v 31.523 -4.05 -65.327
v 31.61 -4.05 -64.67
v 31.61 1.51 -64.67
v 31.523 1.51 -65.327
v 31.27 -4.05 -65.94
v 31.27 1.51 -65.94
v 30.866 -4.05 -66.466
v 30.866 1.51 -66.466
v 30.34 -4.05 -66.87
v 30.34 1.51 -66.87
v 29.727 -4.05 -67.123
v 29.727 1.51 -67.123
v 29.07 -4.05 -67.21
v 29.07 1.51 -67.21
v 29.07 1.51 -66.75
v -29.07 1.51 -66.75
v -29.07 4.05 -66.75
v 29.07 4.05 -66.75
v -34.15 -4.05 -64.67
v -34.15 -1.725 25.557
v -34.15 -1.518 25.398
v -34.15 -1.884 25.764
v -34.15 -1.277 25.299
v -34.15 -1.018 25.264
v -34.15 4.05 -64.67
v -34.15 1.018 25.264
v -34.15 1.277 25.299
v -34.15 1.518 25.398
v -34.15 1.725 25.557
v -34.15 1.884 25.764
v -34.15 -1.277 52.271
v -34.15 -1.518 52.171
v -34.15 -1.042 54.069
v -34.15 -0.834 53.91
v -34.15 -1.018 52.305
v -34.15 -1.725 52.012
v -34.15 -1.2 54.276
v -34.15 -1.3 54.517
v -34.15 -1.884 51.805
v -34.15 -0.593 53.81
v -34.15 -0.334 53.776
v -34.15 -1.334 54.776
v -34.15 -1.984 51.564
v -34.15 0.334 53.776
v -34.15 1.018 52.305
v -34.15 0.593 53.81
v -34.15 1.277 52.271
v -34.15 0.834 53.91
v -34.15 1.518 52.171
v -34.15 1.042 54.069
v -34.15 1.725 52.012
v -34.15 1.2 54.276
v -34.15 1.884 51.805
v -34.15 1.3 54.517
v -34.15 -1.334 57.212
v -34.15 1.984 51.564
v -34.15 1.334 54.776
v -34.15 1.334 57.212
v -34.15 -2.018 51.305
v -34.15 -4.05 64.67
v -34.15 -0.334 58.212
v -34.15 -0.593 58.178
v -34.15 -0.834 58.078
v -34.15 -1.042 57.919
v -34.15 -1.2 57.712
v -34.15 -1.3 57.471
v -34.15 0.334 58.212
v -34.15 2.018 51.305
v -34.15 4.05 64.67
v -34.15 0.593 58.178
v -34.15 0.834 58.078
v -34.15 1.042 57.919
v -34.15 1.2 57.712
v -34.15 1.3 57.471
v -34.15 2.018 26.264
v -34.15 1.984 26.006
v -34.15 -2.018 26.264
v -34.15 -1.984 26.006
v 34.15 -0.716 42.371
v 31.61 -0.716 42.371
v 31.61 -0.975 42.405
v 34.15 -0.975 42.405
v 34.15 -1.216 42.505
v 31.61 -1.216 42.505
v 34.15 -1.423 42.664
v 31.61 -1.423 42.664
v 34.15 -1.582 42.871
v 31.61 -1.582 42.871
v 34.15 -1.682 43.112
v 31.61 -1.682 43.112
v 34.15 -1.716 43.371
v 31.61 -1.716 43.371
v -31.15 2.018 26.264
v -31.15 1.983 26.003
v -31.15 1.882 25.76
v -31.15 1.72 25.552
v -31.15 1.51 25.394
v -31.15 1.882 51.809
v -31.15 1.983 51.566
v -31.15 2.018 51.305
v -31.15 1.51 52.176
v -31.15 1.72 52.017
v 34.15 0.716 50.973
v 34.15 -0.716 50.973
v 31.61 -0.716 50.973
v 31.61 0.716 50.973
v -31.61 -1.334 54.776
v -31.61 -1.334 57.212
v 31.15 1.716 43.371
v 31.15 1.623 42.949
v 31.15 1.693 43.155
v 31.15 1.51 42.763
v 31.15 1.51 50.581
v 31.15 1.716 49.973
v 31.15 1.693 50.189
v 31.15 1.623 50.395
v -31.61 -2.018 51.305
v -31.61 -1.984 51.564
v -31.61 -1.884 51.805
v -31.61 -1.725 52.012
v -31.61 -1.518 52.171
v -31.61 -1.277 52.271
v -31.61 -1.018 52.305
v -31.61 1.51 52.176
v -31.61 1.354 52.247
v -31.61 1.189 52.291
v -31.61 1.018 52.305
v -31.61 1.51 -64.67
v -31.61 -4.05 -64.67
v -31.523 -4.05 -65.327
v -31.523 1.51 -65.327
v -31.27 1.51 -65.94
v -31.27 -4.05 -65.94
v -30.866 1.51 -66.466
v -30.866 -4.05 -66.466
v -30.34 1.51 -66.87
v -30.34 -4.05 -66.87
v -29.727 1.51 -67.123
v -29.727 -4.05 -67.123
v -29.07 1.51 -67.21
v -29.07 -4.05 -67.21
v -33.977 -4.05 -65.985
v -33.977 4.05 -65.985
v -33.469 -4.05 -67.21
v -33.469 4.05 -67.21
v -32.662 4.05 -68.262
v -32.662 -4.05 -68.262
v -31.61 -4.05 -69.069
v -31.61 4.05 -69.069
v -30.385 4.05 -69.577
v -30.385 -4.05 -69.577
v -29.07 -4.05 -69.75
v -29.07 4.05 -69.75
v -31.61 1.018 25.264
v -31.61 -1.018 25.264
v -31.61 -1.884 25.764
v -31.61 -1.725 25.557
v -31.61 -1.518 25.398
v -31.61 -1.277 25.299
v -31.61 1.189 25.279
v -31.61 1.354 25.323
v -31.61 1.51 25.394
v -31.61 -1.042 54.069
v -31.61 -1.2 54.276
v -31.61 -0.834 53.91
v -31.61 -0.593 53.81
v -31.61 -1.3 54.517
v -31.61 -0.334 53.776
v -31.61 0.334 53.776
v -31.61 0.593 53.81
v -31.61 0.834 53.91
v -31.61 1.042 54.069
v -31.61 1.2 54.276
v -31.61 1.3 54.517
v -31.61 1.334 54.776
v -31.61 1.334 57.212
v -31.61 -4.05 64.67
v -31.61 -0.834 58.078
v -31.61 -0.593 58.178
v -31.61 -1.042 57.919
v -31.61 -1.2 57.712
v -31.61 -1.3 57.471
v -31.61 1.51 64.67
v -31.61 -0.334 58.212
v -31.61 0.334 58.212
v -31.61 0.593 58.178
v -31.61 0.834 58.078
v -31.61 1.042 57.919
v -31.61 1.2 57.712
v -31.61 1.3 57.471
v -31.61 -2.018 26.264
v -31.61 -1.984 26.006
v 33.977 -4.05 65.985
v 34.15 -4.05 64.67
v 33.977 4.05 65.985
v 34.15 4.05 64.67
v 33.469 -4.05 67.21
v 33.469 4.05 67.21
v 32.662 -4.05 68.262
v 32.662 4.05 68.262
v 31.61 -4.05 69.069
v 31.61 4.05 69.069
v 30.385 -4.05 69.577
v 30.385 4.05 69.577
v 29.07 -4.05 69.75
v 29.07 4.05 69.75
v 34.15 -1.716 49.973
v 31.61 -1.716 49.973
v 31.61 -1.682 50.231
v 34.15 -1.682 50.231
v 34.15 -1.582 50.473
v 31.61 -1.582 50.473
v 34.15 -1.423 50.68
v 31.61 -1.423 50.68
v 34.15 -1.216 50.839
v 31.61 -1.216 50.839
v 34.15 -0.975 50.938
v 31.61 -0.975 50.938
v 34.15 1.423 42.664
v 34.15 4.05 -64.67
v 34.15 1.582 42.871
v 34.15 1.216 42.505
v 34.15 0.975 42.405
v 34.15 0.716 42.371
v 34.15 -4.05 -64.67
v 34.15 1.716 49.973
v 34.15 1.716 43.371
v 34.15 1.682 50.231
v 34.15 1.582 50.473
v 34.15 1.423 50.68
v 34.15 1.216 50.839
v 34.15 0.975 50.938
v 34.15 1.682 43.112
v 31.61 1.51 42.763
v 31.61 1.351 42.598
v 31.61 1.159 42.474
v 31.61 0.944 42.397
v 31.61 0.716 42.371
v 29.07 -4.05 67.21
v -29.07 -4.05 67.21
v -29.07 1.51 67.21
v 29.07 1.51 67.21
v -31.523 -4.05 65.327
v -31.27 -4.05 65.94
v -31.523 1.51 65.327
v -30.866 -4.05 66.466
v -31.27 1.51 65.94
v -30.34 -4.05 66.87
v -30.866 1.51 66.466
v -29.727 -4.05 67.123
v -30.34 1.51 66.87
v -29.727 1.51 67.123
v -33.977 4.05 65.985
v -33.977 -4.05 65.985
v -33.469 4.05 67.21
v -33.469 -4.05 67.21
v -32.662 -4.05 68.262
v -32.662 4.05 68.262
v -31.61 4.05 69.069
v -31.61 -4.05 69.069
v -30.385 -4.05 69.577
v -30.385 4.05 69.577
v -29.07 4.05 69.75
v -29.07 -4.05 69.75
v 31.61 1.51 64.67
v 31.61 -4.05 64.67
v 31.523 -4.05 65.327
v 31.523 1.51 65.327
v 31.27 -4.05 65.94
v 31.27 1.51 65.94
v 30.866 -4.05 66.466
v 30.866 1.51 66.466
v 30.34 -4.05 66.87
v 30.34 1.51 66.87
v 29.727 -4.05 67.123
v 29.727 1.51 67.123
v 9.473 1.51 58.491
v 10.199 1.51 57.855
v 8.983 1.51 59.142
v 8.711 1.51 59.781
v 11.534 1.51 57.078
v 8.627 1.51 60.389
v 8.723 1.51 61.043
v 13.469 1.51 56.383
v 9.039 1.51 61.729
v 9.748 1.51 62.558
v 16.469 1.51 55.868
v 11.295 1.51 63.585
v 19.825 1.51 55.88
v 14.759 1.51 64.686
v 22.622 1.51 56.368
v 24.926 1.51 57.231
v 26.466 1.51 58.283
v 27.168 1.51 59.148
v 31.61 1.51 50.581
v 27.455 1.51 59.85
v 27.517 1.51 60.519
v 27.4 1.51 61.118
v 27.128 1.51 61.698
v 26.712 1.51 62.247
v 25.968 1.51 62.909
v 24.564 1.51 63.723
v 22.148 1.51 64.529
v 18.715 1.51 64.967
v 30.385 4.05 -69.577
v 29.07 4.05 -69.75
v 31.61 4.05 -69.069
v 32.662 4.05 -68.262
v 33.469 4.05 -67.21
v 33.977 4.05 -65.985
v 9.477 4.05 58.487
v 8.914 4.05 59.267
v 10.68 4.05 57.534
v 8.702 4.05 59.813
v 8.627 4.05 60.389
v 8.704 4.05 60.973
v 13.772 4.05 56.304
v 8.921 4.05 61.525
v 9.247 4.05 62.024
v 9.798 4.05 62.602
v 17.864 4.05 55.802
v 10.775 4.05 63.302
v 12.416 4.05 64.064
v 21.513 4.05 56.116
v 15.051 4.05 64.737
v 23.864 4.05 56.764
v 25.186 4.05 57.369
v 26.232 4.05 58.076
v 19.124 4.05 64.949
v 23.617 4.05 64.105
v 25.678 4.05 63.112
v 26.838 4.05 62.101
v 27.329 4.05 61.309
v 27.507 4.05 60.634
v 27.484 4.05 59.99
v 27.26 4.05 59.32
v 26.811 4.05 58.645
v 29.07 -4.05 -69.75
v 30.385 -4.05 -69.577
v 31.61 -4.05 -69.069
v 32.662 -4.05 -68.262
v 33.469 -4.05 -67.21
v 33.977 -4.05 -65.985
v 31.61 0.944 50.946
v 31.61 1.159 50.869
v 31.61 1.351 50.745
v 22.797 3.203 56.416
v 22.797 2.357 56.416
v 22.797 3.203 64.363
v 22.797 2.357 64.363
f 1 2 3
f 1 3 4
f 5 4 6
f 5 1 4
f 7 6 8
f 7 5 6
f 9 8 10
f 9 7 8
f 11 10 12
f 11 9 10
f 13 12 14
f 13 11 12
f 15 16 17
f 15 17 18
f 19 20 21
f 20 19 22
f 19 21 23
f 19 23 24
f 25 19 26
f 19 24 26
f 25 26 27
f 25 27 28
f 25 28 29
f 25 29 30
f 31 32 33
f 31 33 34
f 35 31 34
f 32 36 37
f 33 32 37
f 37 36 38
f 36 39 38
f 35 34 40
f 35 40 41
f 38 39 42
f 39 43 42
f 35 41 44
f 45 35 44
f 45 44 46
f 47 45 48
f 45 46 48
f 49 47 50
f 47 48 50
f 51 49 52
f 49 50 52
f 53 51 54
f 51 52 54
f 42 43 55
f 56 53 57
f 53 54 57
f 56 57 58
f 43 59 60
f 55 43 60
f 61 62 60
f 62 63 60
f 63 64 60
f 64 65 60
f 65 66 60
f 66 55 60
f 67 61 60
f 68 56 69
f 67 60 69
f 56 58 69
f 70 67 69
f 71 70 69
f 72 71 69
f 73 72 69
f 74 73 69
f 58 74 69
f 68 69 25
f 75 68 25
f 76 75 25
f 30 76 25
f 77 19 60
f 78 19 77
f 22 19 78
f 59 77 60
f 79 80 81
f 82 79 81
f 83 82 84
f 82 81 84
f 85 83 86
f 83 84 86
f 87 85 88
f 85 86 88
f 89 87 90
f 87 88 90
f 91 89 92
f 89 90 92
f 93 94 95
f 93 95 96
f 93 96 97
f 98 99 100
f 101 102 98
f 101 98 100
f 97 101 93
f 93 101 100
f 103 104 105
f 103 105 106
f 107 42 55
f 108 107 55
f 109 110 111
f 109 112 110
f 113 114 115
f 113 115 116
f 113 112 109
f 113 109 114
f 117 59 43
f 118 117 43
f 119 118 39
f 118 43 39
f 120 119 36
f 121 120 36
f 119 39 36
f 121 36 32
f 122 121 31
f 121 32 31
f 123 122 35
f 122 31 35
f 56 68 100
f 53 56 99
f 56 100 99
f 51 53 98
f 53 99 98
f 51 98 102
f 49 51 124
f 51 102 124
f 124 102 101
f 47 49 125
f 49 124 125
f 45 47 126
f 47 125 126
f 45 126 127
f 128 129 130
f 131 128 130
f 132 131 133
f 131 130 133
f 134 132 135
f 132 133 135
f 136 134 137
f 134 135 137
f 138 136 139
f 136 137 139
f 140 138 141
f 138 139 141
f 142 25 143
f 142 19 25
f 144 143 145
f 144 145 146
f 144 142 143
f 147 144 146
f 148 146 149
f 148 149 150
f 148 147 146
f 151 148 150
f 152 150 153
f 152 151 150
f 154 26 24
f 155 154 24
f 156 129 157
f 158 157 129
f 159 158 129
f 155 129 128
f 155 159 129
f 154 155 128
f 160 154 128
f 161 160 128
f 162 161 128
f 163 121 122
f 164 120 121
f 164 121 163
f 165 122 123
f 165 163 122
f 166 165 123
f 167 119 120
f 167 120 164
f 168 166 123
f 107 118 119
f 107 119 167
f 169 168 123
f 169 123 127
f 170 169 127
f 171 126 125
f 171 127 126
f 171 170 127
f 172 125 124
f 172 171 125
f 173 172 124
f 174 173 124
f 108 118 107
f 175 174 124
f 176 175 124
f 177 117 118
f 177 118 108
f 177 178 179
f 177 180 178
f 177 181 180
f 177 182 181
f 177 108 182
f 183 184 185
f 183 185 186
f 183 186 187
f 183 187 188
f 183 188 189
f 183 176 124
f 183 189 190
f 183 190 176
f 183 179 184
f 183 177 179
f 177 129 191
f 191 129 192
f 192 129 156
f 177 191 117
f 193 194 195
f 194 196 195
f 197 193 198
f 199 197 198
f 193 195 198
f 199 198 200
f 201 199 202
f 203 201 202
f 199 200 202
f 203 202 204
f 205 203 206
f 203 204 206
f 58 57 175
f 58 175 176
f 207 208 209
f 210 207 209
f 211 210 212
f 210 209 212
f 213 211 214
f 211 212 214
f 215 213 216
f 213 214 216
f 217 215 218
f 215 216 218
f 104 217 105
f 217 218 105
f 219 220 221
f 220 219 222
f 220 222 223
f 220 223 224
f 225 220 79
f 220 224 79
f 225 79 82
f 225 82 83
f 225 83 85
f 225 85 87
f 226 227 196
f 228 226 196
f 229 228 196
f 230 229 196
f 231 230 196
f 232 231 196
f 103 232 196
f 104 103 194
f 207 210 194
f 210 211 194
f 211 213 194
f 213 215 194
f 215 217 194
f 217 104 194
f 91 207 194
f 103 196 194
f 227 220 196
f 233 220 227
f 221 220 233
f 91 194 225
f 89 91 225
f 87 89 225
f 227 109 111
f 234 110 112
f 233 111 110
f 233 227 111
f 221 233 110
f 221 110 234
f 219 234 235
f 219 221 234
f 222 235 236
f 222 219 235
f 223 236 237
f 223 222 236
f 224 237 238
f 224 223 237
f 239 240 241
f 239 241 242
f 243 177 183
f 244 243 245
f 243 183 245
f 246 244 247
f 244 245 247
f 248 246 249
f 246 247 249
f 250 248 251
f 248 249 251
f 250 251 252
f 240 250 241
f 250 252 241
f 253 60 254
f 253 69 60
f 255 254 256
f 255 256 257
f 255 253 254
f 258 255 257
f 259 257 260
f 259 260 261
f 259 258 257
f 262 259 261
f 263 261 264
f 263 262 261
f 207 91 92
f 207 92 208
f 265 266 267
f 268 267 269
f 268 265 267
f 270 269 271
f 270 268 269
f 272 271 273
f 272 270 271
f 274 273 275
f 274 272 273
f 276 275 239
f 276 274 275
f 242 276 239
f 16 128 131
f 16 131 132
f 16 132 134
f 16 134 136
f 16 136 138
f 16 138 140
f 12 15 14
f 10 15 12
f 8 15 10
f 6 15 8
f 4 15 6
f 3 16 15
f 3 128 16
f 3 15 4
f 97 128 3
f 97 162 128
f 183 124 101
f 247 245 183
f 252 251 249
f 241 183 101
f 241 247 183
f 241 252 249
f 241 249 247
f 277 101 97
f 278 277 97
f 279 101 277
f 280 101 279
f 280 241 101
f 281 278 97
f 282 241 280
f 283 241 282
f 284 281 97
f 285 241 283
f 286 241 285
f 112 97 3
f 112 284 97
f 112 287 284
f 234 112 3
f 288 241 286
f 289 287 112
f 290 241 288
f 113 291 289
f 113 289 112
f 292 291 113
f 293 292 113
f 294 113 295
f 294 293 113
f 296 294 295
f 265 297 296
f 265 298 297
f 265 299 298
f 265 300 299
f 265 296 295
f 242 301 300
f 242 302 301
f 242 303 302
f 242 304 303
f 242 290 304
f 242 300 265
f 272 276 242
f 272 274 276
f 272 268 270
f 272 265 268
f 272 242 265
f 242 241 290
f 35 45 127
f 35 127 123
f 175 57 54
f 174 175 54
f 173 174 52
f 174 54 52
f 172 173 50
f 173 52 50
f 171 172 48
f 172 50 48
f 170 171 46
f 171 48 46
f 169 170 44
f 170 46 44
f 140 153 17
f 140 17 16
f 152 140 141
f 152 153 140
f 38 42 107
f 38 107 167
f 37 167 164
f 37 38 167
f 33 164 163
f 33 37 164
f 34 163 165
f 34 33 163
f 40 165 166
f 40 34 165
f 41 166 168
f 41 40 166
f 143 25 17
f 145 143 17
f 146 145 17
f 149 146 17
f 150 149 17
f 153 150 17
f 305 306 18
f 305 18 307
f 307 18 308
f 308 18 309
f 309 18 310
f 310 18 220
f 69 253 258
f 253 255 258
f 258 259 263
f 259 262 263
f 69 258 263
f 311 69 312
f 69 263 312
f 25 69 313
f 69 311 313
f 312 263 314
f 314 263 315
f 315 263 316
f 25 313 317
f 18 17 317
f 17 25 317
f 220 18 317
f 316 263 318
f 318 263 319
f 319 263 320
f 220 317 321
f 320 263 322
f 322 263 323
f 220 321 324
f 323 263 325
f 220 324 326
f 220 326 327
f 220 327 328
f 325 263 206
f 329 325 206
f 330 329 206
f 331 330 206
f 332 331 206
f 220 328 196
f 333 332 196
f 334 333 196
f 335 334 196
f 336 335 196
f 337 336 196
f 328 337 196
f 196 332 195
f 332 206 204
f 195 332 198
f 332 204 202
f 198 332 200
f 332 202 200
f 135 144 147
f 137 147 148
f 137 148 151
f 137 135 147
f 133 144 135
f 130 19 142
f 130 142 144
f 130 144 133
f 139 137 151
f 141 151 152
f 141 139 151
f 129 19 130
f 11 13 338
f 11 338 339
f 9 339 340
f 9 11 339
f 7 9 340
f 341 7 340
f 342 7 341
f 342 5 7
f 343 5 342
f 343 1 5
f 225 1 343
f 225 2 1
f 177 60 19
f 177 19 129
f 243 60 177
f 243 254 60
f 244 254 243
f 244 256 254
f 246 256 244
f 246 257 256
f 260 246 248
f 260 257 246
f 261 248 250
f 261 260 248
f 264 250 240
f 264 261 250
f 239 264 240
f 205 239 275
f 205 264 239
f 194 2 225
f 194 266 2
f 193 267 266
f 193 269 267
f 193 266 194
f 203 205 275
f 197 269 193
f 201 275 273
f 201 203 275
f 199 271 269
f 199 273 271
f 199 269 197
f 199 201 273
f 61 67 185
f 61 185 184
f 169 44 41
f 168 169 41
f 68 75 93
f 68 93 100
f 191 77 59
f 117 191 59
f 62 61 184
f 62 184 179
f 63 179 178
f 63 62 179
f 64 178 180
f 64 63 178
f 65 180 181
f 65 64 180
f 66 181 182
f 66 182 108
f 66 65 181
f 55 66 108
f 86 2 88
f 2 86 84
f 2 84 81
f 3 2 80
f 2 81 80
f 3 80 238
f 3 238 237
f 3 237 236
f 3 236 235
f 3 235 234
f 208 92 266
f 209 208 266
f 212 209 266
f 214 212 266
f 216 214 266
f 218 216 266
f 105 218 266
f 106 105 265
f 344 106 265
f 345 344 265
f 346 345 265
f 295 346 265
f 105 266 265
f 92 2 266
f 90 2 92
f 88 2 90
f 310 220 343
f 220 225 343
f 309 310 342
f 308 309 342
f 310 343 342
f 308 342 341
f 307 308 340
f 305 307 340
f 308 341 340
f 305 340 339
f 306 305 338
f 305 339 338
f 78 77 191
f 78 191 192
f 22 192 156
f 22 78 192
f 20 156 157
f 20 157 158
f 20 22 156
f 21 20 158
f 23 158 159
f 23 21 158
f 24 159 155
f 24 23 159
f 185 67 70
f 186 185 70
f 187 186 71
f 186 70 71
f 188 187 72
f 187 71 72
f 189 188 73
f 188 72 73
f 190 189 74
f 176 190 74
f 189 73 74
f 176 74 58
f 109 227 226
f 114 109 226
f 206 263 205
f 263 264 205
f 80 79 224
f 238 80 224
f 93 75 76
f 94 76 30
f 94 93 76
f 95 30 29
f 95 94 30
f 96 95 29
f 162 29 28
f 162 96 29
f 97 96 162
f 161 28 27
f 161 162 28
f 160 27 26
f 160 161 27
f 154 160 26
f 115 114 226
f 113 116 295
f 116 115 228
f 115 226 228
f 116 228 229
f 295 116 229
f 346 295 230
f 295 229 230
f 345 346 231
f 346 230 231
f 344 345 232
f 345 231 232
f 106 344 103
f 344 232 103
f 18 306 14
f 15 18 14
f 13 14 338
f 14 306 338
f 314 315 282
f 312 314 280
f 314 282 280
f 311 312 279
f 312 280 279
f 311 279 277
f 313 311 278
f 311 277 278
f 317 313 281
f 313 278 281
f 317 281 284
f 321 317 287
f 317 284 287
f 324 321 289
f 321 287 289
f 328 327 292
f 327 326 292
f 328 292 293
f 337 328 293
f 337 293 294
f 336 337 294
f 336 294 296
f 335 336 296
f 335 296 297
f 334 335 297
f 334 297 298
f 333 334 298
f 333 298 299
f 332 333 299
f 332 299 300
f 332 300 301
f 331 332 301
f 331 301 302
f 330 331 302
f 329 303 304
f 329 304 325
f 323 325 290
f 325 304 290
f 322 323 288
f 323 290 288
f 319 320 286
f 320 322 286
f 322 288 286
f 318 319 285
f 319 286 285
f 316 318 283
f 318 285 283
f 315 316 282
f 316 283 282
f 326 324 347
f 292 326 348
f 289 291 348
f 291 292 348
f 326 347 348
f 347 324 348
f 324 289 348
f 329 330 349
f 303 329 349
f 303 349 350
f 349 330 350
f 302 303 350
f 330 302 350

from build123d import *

# Parameters (mm, degrees)
F0_W          = 68.3
F0_H          = 139.5
F1_DEPTH      = 4.05
F2_R          = 5.08
F3_T          = -2.54
F5_DEPTH      = 30
F7_W          = 32.1311485022
F7_H          = 8.1
F8_DEPTH      = 3
F9_W          = 3.4326917958
F9_H          = 8.6012896579
F10_DEPTH     = 3
F11_W         = 2.6687926147
F11_H         = 4.4363630507
F12_DEPTH     = 3
F13_W         = 4.0359543636
F13_H         = 27.0408764482
F14_DEPTH     = 3
F15_W         = 16.4470494014
F15_H         = 8.1
F8_FACE_W     = 9.5618020964
F8_FACE_H     = 8.1
F16_DEPTH     = 3
F19_T1_DEPTH  = 2.54
F19_T3_DEPTH  = 2.54
F19_T8_DEPTH  = 3
F19_T14_DEPTH = 3
F19_T20_DEPTH = 3
F19_T26_DEPTH = 5.5
F19_T32_DEPTH = 3
F19_T38_DEPTH = 3
F19_T44_DEPTH = 3
F19_T50_DEPTH = 5.5
F19_T56_DEPTH = 5.5
F19_T62_DEPTH = 3
F19_T68_DEPTH = 3
F19_T74_DEPTH = 3
F19_T80_DEPTH = 5.5
F19_T86_DEPTH = 3
F19_T92_DEPTH = 3
F19_T98_DEPTH = 3


# Not quite as in the source:
# - a fillet or chamfer that OpenCascade refuses, or shapes differently, is made with other operations: its cross-section is extruded or revolved along the edge and cut away or added
# - a feature of the source that left no trace in its solid (it failed there, or was rolled back) is left out


with BuildPart() as f1:
    # F0 (on Front) → F1 (new body, symmetric)
    with BuildSketch(Plane.XZ):
        Rectangle(F0_W, F0_H)
    extrude(amount=F1_DEPTH, both=True)

    # F2
    f2_edges = [f1.edges().sort_by_distance(p)[0] for p in [
        (-34.15, 0, 69.75),
        (34.15, 0, 69.75),
        (34.15, 0, -69.75),
        (-34.15, 0, -69.75),
    ]]
    fillet(f2_edges, radius=F2_R)

    # F3
    f3_openings = [f1.faces().sort_by_distance(p)[0] for p in [
        (0, -4.05, 0),
    ]]
    offset(amount=F3_T, openings=f3_openings)

    # F4 (on face) → F5 (cut, symmetric)
    with BuildSketch(Plane.XZ.offset(-1.51)):
        with BuildLine():
            add(Edge.make_bspline(
                [(8.6272396147, 60.3893473744), (8.6272396147, 52.4417168684), (22.797036916, 56.4155321214), (36.9668342173, 60.3893473744), (22.797036916, 64.3631626275), (8.6272396147, 68.3369778805), (8.6272396147, 60.3893473744)],
                knots=[0, 0, 0, 2.0943951024, 2.0943951024, 4.1887902048, 4.1887902048, 6.2831853072, 6.2831853072, 6.2831853072], degree=2, weights=[1, 0.5, 1, 0.5, 1, 0.5, 1]))
        make_face()
    extrude(amount=F5_DEPTH, both=True, mode=Mode.SUBTRACT)

    # F7 (on face) → F8 (cut, symmetric)
    with BuildSketch(Plane(origin=(0, 0, -69.75), x_dir=(1, 0, 0), z_dir=(0, 0, -1))):
        with Locations((3.4426236525, 0)):
            Rectangle(F7_W, F7_H)
    extrude(amount=F8_DEPTH, both=True, mode=Mode.SUBTRACT)

    # F9 (on face) → F10 (cut, symmetric)
    with BuildSketch(Plane.YZ.offset(34.15)):
        with Locations((0, 46.6718673706)):
            Rectangle(F9_W, F9_H)
    extrude(amount=F10_DEPTH, both=True, mode=Mode.SUBTRACT)

    # F11 (on face) → F12 (cut, symmetric)
    with BuildSketch(Plane(origin=(-34.15, 0, 0), x_dir=(0, -1, 0), z_dir=(-1, 0, 0))):
        with Locations((0, 55.9940540446)):
            Rectangle(F11_W, F11_H)
    extrude(amount=F12_DEPTH, both=True, mode=Mode.SUBTRACT)

    # F13 (on face) → F14 (cut, symmetric)
    with BuildSketch(Plane(origin=(-34.15, 0, 0), x_dir=(0, -1, 0), z_dir=(-1, 0, 0))):
        with Locations((0, 38.7848801911)):
            Rectangle(F13_W, F13_H)
    extrude(amount=F14_DEPTH, both=True, mode=Mode.SUBTRACT)

    # F15 (on face) + F8_face (on face) → F16 (cut)
    with BuildSketch(Plane(origin=(0, 0, -69.75), x_dir=(1, 0, 0), z_dir=(0, 0, -1))):
        with Locations((-20.8464752993, 0)):
            Rectangle(F15_W, F15_H)
    with BuildSketch(Plane(origin=(-20.8464752993, 0, -69.75), x_dir=(1, 0, 0), z_dir=(0, 0, -1))):
        with Locations((45.1355742511, 0)):
            Rectangle(F8_FACE_W, F8_FACE_H)
    extrude(amount=-F16_DEPTH, mode=Mode.SUBTRACT)

    # F19: fillet of radius 1 on 12 edges, made by hand

    # F19_s2 → F19_t1 (join)
    with BuildSketch(Plane.YZ.offset(-34.15)):
        with BuildLine():
            ThreePointArc((0.3343963074, 58.21223557), (1.0415030885, 57.9193423511), (1.3343963074, 57.21223557))
            Line((1.3343963074, 57.21223557), (1.3343963074, 58.21223557))
            Line((1.3343963074, 58.21223557), (0.3343963074, 58.21223557))
        make_face()
        with BuildLine():
            ThreePointArc((1.3343963074, 54.7758725193), (1.0415030885, 54.0687657381), (0.3343963074, 53.7758725193))
            Line((0.3343963074, 53.7758725193), (1.3343963074, 53.7758725193))
            Line((1.3343963074, 53.7758725193), (1.3343963074, 54.7758725193))
        make_face()
        with BuildLine():
            ThreePointArc((-1.3343963074, 54.7758725193), (-1.0415030885, 54.0687657381), (-0.3343963074, 53.7758725193))
            Line((-0.3343963074, 53.7758725193), (-1.3343963074, 53.7758725193))
            Line((-1.3343963074, 53.7758725193), (-1.3343963074, 54.7758725193))
        make_face()
        with BuildLine():
            ThreePointArc((-0.3343963074, 58.21223557), (-1.0415030885, 57.9193423511), (-1.3343963074, 57.21223557))
            Line((-1.3343963074, 57.21223557), (-1.3343963074, 58.21223557))
            Line((-1.3343963074, 58.21223557), (-0.3343963074, 58.21223557))
        make_face()
        with BuildLine():
            ThreePointArc((-2.0179771818, 26.264441967), (-1.725083963, 25.5573351858), (-1.0179771818, 25.264441967))
            Line((-1.0179771818, 25.264441967), (-2.0179771818, 25.264441967))
            Line((-2.0179771818, 25.264441967), (-2.0179771818, 26.264441967))
        make_face()
        with BuildLine():
            ThreePointArc((-2.0179771818, 51.3053184152), (-1.725083963, 52.0124251964), (-1.0179771818, 52.3053184152))
            Line((-1.0179771818, 52.3053184152), (-2.0179771818, 52.3053184152))
            Line((-2.0179771818, 52.3053184152), (-2.0179771818, 51.3053184152))
        make_face()
    extrude(amount=F19_T1_DEPTH)

    # F19_s4 → F19_t3 (join)
    with BuildSketch(Plane.YZ.offset(31.61)):
        with BuildLine():
            ThreePointArc((-0.7163458979, 42.3712225417), (-1.4234526791, 42.6641157605), (-1.7163458979, 43.3712225417))
            Line((-1.7163458979, 43.3712225417), (-1.7163458979, 42.3712225417))
            Line((-1.7163458979, 42.3712225417), (-0.7163458979, 42.3712225417))
        make_face()
        with BuildLine():
            ThreePointArc((-1.7163458979, 49.9725121995), (-1.4234526791, 50.6796189807), (-0.7163458979, 50.9725121995))
            Line((-0.7163458979, 50.9725121995), (-1.7163458979, 50.9725121995))
            Line((-1.7163458979, 50.9725121995), (-1.7163458979, 49.9725121995))
        make_face()
    extrude(amount=F19_T3_DEPTH)


with BuildPart() as f19_tool6:
    # F19_s7 → F19_t8 (new body)
    with BuildSketch(Plane.YZ.offset(34.15)):
        with BuildLine():
            ThreePointArc((1.7163458979, 43.3712225417), (1.4234526791, 42.6641157605), (0.7163458979, 42.3712225417))
            Line((0.7163458979, 42.3712225417), (1.7163458979, 42.3712225417))
            Line((1.7163458979, 42.3712225417), (1.7163458979, 43.3712225417))
        make_face()
    extrude(amount=-F19_T8_DEPTH)

    split(bisect_by=Plane.XZ.offset(-1.51), keep=Keep.BOTTOM)

    split(bisect_by=Plane.YZ.offset(31.61), keep=Keep.TOP)


with BuildPart() as f1_1:
    add(f1.part)

    # F19_t5: union F19_tool6
    add(f19_tool6.part)


with BuildPart() as f19_tool12:
    # F19_s13 → F19_t14 (new body)
    with BuildSketch(Plane.YZ.offset(34.15)):
        with BuildLine():
            ThreePointArc((1.7163458979, 43.3712225417), (1.4234526791, 42.6641157605), (0.7163458979, 42.3712225417))
            Line((0.7163458979, 42.3712225417), (1.7163458979, 42.3712225417))
            Line((1.7163458979, 42.3712225417), (1.7163458979, 43.3712225417))
        make_face()
    extrude(amount=-F19_T14_DEPTH)

    split(bisect_by=Plane.XZ.offset(-1.51), keep=Keep.TOP)

    split(bisect_by=Plane.YZ.offset(31.61), keep=Keep.TOP)


with BuildPart() as f1_2:
    add(f1_1.part)

    # F19_t11: union F19_tool12
    add(f19_tool12.part)


with BuildPart() as f19_tool18:
    # F19_s19 → F19_t20 (new body)
    with BuildSketch(Plane.YZ.offset(34.15)):
        with BuildLine():
            ThreePointArc((1.7163458979, 43.3712225417), (1.4234526791, 42.6641157605), (0.7163458979, 42.3712225417))
            Line((0.7163458979, 42.3712225417), (1.7163458979, 42.3712225417))
            Line((1.7163458979, 42.3712225417), (1.7163458979, 43.3712225417))
        make_face()
    extrude(amount=-F19_T20_DEPTH)

    split(bisect_by=Plane.XZ.offset(-1.51), keep=Keep.BOTTOM)

    split(bisect_by=Plane.YZ.offset(31.61), keep=Keep.BOTTOM)


with BuildPart() as f1_3:
    add(f1_2.part)

    # F19_t17: union F19_tool18
    add(f19_tool18.part)


with BuildPart() as f19_tool24:
    # F19_s25 → F19_t26 (new body)
    with BuildSketch(Plane.YZ.offset(34.15)):
        with BuildLine():
            ThreePointArc((1.7163458979, 43.3712225417), (1.4234526791, 42.6641157605), (0.7163458979, 42.3712225417))
            Line((0.7163458979, 42.3712225417), (1.7163458979, 42.3712225417))
            Line((1.7163458979, 42.3712225417), (1.7163458979, 43.3712225417))
        make_face()
    extrude(amount=-F19_T26_DEPTH)

    split(bisect_by=Plane.YZ.offset(31.15), keep=Keep.BOTTOM)

    split(bisect_by=Plane.XZ.offset(-1.51), keep=Keep.BOTTOM)


with BuildPart() as f1_4:
    add(f1_3.part)

    # F19_t23: union F19_tool24
    add(f19_tool24.part)


with BuildPart() as f19_tool30:
    # F19_s31 → F19_t32 (new body)
    with BuildSketch(Plane.YZ.offset(34.15)):
        with BuildLine():
            ThreePointArc((1.7163458979, 49.9725121995), (1.4234526791, 50.6796189807), (0.7163458979, 50.9725121995))
            Line((0.7163458979, 50.9725121995), (1.7163458979, 50.9725121995))
            Line((1.7163458979, 50.9725121995), (1.7163458979, 49.9725121995))
        make_face()
    extrude(amount=-F19_T32_DEPTH)

    split(bisect_by=Plane.XZ.offset(-1.51), keep=Keep.BOTTOM)

    split(bisect_by=Plane.YZ.offset(31.61), keep=Keep.TOP)


with BuildPart() as f1_5:
    add(f1_4.part)

    # F19_t29: union F19_tool30
    add(f19_tool30.part)


with BuildPart() as f19_tool36:
    # F19_s37 → F19_t38 (new body)
    with BuildSketch(Plane.YZ.offset(34.15)):
        with BuildLine():
            ThreePointArc((1.7163458979, 49.9725121995), (1.4234526791, 50.6796189807), (0.7163458979, 50.9725121995))
            Line((0.7163458979, 50.9725121995), (1.7163458979, 50.9725121995))
            Line((1.7163458979, 50.9725121995), (1.7163458979, 49.9725121995))
        make_face()
    extrude(amount=-F19_T38_DEPTH)

    split(bisect_by=Plane.XZ.offset(-1.51), keep=Keep.TOP)

    split(bisect_by=Plane.YZ.offset(31.61), keep=Keep.TOP)


with BuildPart() as f1_6:
    add(f1_5.part)

    # F19_t35: union F19_tool36
    add(f19_tool36.part)


with BuildPart() as f19_tool42:
    # F19_s43 → F19_t44 (new body)
    with BuildSketch(Plane.YZ.offset(34.15)):
        with BuildLine():
            ThreePointArc((1.7163458979, 49.9725121995), (1.4234526791, 50.6796189807), (0.7163458979, 50.9725121995))
            Line((0.7163458979, 50.9725121995), (1.7163458979, 50.9725121995))
            Line((1.7163458979, 50.9725121995), (1.7163458979, 49.9725121995))
        make_face()
    extrude(amount=-F19_T44_DEPTH)

    split(bisect_by=Plane.XZ.offset(-1.51), keep=Keep.BOTTOM)

    split(bisect_by=Plane.YZ.offset(31.61), keep=Keep.BOTTOM)


with BuildPart() as f1_7:
    add(f1_6.part)

    # F19_t41: union F19_tool42
    add(f19_tool42.part)


with BuildPart() as f19_tool48:
    # F19_s49 → F19_t50 (new body)
    with BuildSketch(Plane.YZ.offset(34.15)):
        with BuildLine():
            ThreePointArc((1.7163458979, 49.9725121995), (1.4234526791, 50.6796189807), (0.7163458979, 50.9725121995))
            Line((0.7163458979, 50.9725121995), (1.7163458979, 50.9725121995))
            Line((1.7163458979, 50.9725121995), (1.7163458979, 49.9725121995))
        make_face()
    extrude(amount=-F19_T50_DEPTH)

    split(bisect_by=Plane.YZ.offset(31.15), keep=Keep.BOTTOM)

    split(bisect_by=Plane.XZ.offset(-1.51), keep=Keep.BOTTOM)


with BuildPart() as f1_8:
    add(f1_7.part)

    # F19_t47: union F19_tool48
    add(f19_tool48.part)


with BuildPart() as f19_tool54:
    # F19_s55 → F19_t56 (new body)
    with BuildSketch(Plane.YZ.offset(-28.65)):
        with BuildLine():
            ThreePointArc((2.0179771818, 51.3053184152), (1.725083963, 52.0124251964), (1.0179771818, 52.3053184152))
            Line((1.0179771818, 52.3053184152), (2.0179771818, 52.3053184152))
            Line((2.0179771818, 52.3053184152), (2.0179771818, 51.3053184152))
        make_face()
    extrude(amount=-F19_T56_DEPTH)

    split(bisect_by=Plane.XZ.offset(-1.51), keep=Keep.BOTTOM)

    split(bisect_by=Plane.YZ.offset(-31.15), keep=Keep.TOP)


with BuildPart() as f1_9:
    add(f1_8.part)

    # F19_t53: union F19_tool54
    add(f19_tool54.part)


with BuildPart() as f19_tool60:
    # F19_s61 → F19_t62 (new body)
    with BuildSketch(Plane.YZ.offset(-31.15)):
        with BuildLine():
            ThreePointArc((2.0179771818, 51.3053184152), (1.725083963, 52.0124251964), (1.0179771818, 52.3053184152))
            Line((1.0179771818, 52.3053184152), (2.0179771818, 52.3053184152))
            Line((2.0179771818, 52.3053184152), (2.0179771818, 51.3053184152))
        make_face()
    extrude(amount=-F19_T62_DEPTH)

    split(bisect_by=Plane.XZ.offset(-1.51), keep=Keep.BOTTOM)

    split(bisect_by=Plane.YZ.offset(-31.61), keep=Keep.TOP)


with BuildPart() as f1_10:
    add(f1_9.part)

    # F19_t59: union F19_tool60
    add(f19_tool60.part)


with BuildPart() as f19_tool66:
    # F19_s67 → F19_t68 (new body)
    with BuildSketch(Plane.YZ.offset(-31.15)):
        with BuildLine():
            ThreePointArc((2.0179771818, 51.3053184152), (1.725083963, 52.0124251964), (1.0179771818, 52.3053184152))
            Line((1.0179771818, 52.3053184152), (2.0179771818, 52.3053184152))
            Line((2.0179771818, 52.3053184152), (2.0179771818, 51.3053184152))
        make_face()
    extrude(amount=-F19_T68_DEPTH)

    split(bisect_by=Plane.XZ.offset(-1.51), keep=Keep.BOTTOM)

    split(bisect_by=Plane.YZ.offset(-31.61), keep=Keep.BOTTOM)


with BuildPart() as f1_11:
    add(f1_10.part)

    # F19_t65: union F19_tool66
    add(f19_tool66.part)


with BuildPart() as f19_tool72:
    # F19_s73 → F19_t74 (new body)
    with BuildSketch(Plane.YZ.offset(-31.15)):
        with BuildLine():
            ThreePointArc((2.0179771818, 51.3053184152), (1.725083963, 52.0124251964), (1.0179771818, 52.3053184152))
            Line((1.0179771818, 52.3053184152), (2.0179771818, 52.3053184152))
            Line((2.0179771818, 52.3053184152), (2.0179771818, 51.3053184152))
        make_face()
    extrude(amount=-F19_T74_DEPTH)

    split(bisect_by=Plane.XZ.offset(-1.51), keep=Keep.TOP)

    split(bisect_by=Plane.YZ.offset(-31.61), keep=Keep.BOTTOM)


with BuildPart() as f1_12:
    add(f1_11.part)

    # F19_t71: union F19_tool72
    add(f19_tool72.part)


with BuildPart() as f19_tool78:
    # F19_s79 → F19_t80 (new body)
    with BuildSketch(Plane.YZ.offset(-28.65)):
        with BuildLine():
            ThreePointArc((2.0179771818, 26.264441967), (1.725083963, 25.5573351858), (1.0179771818, 25.264441967))
            Line((1.0179771818, 25.264441967), (2.0179771818, 25.264441967))
            Line((2.0179771818, 25.264441967), (2.0179771818, 26.264441967))
        make_face()
    extrude(amount=-F19_T80_DEPTH)

    split(bisect_by=Plane.XZ.offset(-1.51), keep=Keep.BOTTOM)

    split(bisect_by=Plane.YZ.offset(-31.15), keep=Keep.TOP)


with BuildPart() as f1_13:
    add(f1_12.part)

    # F19_t77: union F19_tool78
    add(f19_tool78.part)


with BuildPart() as f19_tool84:
    # F19_s85 → F19_t86 (new body)
    with BuildSketch(Plane.YZ.offset(-31.15)):
        with BuildLine():
            ThreePointArc((2.0179771818, 26.264441967), (1.725083963, 25.5573351858), (1.0179771818, 25.264441967))
            Line((1.0179771818, 25.264441967), (2.0179771818, 25.264441967))
            Line((2.0179771818, 25.264441967), (2.0179771818, 26.264441967))
        make_face()
    extrude(amount=-F19_T86_DEPTH)

    split(bisect_by=Plane.XZ.offset(-1.51), keep=Keep.BOTTOM)

    split(bisect_by=Plane.YZ.offset(-31.61), keep=Keep.TOP)


with BuildPart() as f1_14:
    add(f1_13.part)

    # F19_t83: union F19_tool84
    add(f19_tool84.part)


with BuildPart() as f19_tool90:
    # F19_s91 → F19_t92 (new body)
    with BuildSketch(Plane.YZ.offset(-31.15)):
        with BuildLine():
            ThreePointArc((2.0179771818, 26.264441967), (1.725083963, 25.5573351858), (1.0179771818, 25.264441967))
            Line((1.0179771818, 25.264441967), (2.0179771818, 25.264441967))
            Line((2.0179771818, 25.264441967), (2.0179771818, 26.264441967))
        make_face()
    extrude(amount=-F19_T92_DEPTH)

    split(bisect_by=Plane.XZ.offset(-1.51), keep=Keep.BOTTOM)

    split(bisect_by=Plane.YZ.offset(-31.61), keep=Keep.BOTTOM)


with BuildPart() as f1_15:
    add(f1_14.part)

    # F19_t89: union F19_tool90
    add(f19_tool90.part)


with BuildPart() as f19_tool96:
    # F19_s97 → F19_t98 (new body)
    with BuildSketch(Plane.YZ.offset(-31.15)):
        with BuildLine():
            ThreePointArc((2.0179771818, 26.264441967), (1.725083963, 25.5573351858), (1.0179771818, 25.264441967))
            Line((1.0179771818, 25.264441967), (2.0179771818, 25.264441967))
            Line((2.0179771818, 25.264441967), (2.0179771818, 26.264441967))
        make_face()
    extrude(amount=-F19_T98_DEPTH)

    split(bisect_by=Plane.XZ.offset(-1.51), keep=Keep.TOP)

    split(bisect_by=Plane.YZ.offset(-31.61), keep=Keep.BOTTOM)


with BuildPart() as f1_16:
    add(f1_15.part)

    # F19_t95: union F19_tool96
    add(f19_tool96.part)


solid = f1_16.part
